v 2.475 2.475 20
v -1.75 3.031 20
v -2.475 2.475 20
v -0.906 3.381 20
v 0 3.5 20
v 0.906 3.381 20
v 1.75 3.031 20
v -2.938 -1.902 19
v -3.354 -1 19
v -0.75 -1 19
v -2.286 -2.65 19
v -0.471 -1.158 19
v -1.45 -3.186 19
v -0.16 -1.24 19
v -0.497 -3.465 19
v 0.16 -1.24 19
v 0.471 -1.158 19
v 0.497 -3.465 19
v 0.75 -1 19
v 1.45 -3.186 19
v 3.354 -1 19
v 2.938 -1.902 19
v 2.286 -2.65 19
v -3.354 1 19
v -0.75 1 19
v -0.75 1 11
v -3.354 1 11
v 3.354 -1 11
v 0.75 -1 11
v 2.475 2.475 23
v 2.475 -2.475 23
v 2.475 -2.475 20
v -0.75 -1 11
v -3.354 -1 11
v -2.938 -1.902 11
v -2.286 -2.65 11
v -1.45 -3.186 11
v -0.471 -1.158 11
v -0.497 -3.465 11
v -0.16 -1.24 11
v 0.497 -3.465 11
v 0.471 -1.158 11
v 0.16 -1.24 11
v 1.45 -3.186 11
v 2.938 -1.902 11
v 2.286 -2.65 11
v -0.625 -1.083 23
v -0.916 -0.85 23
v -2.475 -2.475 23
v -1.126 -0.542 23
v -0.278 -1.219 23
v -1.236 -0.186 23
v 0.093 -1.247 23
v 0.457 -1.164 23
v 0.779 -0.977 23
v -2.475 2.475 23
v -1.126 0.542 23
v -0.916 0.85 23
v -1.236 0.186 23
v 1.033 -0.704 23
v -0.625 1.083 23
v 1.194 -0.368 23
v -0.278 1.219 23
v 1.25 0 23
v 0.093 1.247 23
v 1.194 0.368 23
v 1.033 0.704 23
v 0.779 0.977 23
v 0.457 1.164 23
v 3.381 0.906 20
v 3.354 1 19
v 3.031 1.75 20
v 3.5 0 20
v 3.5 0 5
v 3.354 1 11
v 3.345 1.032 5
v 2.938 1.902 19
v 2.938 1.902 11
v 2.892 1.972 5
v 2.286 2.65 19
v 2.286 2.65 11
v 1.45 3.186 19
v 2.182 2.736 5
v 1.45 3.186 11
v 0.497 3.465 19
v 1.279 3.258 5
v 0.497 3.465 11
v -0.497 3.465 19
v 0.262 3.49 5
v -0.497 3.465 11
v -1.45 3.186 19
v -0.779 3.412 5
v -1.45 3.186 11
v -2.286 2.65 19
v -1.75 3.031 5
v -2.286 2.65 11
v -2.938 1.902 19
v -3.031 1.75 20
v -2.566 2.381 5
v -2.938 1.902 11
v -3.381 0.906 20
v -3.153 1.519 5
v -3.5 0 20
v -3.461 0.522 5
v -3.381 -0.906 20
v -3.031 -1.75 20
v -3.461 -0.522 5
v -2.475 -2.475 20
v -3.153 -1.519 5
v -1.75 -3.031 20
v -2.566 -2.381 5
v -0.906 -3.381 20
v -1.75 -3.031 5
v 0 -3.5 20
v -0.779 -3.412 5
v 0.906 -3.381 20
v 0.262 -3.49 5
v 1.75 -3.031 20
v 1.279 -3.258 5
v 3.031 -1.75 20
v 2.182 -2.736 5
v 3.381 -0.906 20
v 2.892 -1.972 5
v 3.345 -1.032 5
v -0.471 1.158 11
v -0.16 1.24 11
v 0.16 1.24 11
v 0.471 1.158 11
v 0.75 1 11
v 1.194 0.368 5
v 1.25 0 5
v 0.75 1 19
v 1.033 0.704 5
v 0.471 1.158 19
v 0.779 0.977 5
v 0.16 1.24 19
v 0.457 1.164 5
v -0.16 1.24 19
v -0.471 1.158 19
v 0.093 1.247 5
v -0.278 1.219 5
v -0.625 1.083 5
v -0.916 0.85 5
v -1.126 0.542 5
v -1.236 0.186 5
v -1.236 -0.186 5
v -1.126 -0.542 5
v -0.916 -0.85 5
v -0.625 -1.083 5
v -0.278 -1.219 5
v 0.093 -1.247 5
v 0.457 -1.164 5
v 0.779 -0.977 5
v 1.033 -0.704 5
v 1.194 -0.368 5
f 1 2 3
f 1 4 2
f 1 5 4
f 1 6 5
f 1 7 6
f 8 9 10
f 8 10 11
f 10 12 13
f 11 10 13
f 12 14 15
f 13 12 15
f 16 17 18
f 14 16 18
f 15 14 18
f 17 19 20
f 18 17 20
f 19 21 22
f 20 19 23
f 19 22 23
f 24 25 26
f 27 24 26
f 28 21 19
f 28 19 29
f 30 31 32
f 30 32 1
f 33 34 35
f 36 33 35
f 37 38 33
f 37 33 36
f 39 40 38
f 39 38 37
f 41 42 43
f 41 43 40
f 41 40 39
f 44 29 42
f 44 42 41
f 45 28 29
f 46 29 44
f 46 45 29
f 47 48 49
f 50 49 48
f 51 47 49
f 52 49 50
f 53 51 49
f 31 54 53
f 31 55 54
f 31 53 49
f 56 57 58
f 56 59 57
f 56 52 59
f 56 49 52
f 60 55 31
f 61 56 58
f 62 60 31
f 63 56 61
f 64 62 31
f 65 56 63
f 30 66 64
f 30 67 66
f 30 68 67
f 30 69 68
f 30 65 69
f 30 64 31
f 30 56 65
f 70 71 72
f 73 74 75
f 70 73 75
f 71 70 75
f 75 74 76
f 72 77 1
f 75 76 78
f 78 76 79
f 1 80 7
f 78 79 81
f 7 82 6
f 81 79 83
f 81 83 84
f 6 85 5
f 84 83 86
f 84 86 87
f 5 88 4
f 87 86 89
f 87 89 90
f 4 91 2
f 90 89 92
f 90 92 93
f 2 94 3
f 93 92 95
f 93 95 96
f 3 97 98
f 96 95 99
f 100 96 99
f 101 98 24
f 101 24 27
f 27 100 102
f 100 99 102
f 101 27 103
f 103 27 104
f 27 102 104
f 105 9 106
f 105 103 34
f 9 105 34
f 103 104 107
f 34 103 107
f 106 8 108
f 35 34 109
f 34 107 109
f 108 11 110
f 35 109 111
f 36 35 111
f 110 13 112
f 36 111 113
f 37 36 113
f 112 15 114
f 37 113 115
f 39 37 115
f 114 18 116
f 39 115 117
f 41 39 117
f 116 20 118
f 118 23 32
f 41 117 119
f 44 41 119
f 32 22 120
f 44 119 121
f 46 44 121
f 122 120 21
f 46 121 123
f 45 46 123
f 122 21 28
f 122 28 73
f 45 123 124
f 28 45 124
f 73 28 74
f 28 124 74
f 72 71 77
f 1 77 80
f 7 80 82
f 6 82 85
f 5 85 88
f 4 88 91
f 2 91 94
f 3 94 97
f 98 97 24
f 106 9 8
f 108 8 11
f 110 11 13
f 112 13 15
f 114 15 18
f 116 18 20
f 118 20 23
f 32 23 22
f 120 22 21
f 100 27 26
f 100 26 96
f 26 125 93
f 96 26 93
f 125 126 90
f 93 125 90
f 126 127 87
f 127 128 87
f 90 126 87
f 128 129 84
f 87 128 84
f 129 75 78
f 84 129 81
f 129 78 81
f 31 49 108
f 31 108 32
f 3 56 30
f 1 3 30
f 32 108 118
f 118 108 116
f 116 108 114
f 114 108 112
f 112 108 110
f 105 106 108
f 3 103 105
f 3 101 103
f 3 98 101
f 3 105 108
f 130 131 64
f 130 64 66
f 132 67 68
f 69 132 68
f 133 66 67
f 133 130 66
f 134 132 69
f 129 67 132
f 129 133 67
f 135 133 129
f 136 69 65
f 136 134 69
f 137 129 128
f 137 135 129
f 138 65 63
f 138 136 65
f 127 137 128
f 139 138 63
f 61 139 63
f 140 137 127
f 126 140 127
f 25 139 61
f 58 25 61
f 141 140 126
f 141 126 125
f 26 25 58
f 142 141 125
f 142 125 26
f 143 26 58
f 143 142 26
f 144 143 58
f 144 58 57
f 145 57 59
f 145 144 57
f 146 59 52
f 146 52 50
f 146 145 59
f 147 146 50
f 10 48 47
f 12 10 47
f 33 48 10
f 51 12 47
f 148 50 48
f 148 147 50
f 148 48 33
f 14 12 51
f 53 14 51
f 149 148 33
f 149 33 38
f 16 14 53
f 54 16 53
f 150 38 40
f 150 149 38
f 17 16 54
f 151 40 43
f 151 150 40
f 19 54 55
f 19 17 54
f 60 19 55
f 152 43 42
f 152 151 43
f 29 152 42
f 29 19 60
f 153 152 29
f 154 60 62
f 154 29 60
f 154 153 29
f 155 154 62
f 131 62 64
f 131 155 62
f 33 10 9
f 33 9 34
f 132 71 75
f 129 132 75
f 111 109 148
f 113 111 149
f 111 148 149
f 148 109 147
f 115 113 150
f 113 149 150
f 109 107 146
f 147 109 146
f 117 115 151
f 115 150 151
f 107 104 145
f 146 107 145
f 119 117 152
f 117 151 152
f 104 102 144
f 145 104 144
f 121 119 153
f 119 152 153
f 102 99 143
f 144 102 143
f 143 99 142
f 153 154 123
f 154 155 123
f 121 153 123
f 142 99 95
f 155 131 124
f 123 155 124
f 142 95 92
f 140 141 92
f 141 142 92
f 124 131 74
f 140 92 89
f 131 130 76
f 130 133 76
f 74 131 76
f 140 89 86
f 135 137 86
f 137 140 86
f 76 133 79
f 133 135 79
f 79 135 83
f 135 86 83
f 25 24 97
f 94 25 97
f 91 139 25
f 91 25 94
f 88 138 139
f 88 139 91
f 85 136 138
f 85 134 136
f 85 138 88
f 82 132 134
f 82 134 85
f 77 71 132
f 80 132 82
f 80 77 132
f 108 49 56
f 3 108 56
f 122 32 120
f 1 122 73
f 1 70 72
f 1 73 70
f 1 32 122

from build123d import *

# Parameters (mm, degrees)
BOSS_EXTRUDE1_START = 5
SKETCH3_R           = 3.5
SKETCH3_R_2         = 1.25
BOSS_EXTRUDE1_DEPTH = 18
SKETCH4_W           = 8
SKETCH4_H           = 2.5
CUT_EXTRUDE1_DEPTH  = 4.5
SKETCH5_OUTSIDE_W   = 13.108
SKETCH5_OUTSIDE_H   = 13.108
SKETCH5_OUTSIDE_W_2 = 4.949747468
SKETCH5_OUTSIDE_H_2 = 4.949747468
CUT_EXTRUDE2_DEPTH  = 3


with BuildPart() as part:
    # Sketch3 → Boss-Extrude1 (new body)
    with BuildSketch(Plane.XY.offset(BOSS_EXTRUDE1_START)):
        Circle(SKETCH3_R)
        Circle(SKETCH3_R_2, mode=Mode.SUBTRACT)
    extrude(amount=BOSS_EXTRUDE1_DEPTH)

    # Sketch4 → Cut-Extrude1 (cut, symmetric)
    with BuildSketch(Plane(origin=(0, 0, 0), x_dir=(0, 0, -1), z_dir=(1, 0, 0))):
        with Locations((-15, 2.25)):
            Rectangle(SKETCH4_W, SKETCH4_H)
    cut_extrude1 = extrude(amount=CUT_EXTRUDE1_DEPTH, both=True, mode=Mode.SUBTRACT)

    # Mirror1: Cut-Extrude1 across plane
    add(cut_extrude1.mirror(Plane.ZX), mode=Mode.SUBTRACT)

    # Sketch5 outside → Cut-Extrude2 (cut)
    with BuildSketch(Plane.XY.offset(23)):
        Rectangle(SKETCH5_OUTSIDE_W, SKETCH5_OUTSIDE_H)
        Rectangle(SKETCH5_OUTSIDE_W_2, SKETCH5_OUTSIDE_H_2, mode=Mode.SUBTRACT)
    extrude(amount=-CUT_EXTRUDE2_DEPTH, mode=Mode.SUBTRACT)


solid = part.part
